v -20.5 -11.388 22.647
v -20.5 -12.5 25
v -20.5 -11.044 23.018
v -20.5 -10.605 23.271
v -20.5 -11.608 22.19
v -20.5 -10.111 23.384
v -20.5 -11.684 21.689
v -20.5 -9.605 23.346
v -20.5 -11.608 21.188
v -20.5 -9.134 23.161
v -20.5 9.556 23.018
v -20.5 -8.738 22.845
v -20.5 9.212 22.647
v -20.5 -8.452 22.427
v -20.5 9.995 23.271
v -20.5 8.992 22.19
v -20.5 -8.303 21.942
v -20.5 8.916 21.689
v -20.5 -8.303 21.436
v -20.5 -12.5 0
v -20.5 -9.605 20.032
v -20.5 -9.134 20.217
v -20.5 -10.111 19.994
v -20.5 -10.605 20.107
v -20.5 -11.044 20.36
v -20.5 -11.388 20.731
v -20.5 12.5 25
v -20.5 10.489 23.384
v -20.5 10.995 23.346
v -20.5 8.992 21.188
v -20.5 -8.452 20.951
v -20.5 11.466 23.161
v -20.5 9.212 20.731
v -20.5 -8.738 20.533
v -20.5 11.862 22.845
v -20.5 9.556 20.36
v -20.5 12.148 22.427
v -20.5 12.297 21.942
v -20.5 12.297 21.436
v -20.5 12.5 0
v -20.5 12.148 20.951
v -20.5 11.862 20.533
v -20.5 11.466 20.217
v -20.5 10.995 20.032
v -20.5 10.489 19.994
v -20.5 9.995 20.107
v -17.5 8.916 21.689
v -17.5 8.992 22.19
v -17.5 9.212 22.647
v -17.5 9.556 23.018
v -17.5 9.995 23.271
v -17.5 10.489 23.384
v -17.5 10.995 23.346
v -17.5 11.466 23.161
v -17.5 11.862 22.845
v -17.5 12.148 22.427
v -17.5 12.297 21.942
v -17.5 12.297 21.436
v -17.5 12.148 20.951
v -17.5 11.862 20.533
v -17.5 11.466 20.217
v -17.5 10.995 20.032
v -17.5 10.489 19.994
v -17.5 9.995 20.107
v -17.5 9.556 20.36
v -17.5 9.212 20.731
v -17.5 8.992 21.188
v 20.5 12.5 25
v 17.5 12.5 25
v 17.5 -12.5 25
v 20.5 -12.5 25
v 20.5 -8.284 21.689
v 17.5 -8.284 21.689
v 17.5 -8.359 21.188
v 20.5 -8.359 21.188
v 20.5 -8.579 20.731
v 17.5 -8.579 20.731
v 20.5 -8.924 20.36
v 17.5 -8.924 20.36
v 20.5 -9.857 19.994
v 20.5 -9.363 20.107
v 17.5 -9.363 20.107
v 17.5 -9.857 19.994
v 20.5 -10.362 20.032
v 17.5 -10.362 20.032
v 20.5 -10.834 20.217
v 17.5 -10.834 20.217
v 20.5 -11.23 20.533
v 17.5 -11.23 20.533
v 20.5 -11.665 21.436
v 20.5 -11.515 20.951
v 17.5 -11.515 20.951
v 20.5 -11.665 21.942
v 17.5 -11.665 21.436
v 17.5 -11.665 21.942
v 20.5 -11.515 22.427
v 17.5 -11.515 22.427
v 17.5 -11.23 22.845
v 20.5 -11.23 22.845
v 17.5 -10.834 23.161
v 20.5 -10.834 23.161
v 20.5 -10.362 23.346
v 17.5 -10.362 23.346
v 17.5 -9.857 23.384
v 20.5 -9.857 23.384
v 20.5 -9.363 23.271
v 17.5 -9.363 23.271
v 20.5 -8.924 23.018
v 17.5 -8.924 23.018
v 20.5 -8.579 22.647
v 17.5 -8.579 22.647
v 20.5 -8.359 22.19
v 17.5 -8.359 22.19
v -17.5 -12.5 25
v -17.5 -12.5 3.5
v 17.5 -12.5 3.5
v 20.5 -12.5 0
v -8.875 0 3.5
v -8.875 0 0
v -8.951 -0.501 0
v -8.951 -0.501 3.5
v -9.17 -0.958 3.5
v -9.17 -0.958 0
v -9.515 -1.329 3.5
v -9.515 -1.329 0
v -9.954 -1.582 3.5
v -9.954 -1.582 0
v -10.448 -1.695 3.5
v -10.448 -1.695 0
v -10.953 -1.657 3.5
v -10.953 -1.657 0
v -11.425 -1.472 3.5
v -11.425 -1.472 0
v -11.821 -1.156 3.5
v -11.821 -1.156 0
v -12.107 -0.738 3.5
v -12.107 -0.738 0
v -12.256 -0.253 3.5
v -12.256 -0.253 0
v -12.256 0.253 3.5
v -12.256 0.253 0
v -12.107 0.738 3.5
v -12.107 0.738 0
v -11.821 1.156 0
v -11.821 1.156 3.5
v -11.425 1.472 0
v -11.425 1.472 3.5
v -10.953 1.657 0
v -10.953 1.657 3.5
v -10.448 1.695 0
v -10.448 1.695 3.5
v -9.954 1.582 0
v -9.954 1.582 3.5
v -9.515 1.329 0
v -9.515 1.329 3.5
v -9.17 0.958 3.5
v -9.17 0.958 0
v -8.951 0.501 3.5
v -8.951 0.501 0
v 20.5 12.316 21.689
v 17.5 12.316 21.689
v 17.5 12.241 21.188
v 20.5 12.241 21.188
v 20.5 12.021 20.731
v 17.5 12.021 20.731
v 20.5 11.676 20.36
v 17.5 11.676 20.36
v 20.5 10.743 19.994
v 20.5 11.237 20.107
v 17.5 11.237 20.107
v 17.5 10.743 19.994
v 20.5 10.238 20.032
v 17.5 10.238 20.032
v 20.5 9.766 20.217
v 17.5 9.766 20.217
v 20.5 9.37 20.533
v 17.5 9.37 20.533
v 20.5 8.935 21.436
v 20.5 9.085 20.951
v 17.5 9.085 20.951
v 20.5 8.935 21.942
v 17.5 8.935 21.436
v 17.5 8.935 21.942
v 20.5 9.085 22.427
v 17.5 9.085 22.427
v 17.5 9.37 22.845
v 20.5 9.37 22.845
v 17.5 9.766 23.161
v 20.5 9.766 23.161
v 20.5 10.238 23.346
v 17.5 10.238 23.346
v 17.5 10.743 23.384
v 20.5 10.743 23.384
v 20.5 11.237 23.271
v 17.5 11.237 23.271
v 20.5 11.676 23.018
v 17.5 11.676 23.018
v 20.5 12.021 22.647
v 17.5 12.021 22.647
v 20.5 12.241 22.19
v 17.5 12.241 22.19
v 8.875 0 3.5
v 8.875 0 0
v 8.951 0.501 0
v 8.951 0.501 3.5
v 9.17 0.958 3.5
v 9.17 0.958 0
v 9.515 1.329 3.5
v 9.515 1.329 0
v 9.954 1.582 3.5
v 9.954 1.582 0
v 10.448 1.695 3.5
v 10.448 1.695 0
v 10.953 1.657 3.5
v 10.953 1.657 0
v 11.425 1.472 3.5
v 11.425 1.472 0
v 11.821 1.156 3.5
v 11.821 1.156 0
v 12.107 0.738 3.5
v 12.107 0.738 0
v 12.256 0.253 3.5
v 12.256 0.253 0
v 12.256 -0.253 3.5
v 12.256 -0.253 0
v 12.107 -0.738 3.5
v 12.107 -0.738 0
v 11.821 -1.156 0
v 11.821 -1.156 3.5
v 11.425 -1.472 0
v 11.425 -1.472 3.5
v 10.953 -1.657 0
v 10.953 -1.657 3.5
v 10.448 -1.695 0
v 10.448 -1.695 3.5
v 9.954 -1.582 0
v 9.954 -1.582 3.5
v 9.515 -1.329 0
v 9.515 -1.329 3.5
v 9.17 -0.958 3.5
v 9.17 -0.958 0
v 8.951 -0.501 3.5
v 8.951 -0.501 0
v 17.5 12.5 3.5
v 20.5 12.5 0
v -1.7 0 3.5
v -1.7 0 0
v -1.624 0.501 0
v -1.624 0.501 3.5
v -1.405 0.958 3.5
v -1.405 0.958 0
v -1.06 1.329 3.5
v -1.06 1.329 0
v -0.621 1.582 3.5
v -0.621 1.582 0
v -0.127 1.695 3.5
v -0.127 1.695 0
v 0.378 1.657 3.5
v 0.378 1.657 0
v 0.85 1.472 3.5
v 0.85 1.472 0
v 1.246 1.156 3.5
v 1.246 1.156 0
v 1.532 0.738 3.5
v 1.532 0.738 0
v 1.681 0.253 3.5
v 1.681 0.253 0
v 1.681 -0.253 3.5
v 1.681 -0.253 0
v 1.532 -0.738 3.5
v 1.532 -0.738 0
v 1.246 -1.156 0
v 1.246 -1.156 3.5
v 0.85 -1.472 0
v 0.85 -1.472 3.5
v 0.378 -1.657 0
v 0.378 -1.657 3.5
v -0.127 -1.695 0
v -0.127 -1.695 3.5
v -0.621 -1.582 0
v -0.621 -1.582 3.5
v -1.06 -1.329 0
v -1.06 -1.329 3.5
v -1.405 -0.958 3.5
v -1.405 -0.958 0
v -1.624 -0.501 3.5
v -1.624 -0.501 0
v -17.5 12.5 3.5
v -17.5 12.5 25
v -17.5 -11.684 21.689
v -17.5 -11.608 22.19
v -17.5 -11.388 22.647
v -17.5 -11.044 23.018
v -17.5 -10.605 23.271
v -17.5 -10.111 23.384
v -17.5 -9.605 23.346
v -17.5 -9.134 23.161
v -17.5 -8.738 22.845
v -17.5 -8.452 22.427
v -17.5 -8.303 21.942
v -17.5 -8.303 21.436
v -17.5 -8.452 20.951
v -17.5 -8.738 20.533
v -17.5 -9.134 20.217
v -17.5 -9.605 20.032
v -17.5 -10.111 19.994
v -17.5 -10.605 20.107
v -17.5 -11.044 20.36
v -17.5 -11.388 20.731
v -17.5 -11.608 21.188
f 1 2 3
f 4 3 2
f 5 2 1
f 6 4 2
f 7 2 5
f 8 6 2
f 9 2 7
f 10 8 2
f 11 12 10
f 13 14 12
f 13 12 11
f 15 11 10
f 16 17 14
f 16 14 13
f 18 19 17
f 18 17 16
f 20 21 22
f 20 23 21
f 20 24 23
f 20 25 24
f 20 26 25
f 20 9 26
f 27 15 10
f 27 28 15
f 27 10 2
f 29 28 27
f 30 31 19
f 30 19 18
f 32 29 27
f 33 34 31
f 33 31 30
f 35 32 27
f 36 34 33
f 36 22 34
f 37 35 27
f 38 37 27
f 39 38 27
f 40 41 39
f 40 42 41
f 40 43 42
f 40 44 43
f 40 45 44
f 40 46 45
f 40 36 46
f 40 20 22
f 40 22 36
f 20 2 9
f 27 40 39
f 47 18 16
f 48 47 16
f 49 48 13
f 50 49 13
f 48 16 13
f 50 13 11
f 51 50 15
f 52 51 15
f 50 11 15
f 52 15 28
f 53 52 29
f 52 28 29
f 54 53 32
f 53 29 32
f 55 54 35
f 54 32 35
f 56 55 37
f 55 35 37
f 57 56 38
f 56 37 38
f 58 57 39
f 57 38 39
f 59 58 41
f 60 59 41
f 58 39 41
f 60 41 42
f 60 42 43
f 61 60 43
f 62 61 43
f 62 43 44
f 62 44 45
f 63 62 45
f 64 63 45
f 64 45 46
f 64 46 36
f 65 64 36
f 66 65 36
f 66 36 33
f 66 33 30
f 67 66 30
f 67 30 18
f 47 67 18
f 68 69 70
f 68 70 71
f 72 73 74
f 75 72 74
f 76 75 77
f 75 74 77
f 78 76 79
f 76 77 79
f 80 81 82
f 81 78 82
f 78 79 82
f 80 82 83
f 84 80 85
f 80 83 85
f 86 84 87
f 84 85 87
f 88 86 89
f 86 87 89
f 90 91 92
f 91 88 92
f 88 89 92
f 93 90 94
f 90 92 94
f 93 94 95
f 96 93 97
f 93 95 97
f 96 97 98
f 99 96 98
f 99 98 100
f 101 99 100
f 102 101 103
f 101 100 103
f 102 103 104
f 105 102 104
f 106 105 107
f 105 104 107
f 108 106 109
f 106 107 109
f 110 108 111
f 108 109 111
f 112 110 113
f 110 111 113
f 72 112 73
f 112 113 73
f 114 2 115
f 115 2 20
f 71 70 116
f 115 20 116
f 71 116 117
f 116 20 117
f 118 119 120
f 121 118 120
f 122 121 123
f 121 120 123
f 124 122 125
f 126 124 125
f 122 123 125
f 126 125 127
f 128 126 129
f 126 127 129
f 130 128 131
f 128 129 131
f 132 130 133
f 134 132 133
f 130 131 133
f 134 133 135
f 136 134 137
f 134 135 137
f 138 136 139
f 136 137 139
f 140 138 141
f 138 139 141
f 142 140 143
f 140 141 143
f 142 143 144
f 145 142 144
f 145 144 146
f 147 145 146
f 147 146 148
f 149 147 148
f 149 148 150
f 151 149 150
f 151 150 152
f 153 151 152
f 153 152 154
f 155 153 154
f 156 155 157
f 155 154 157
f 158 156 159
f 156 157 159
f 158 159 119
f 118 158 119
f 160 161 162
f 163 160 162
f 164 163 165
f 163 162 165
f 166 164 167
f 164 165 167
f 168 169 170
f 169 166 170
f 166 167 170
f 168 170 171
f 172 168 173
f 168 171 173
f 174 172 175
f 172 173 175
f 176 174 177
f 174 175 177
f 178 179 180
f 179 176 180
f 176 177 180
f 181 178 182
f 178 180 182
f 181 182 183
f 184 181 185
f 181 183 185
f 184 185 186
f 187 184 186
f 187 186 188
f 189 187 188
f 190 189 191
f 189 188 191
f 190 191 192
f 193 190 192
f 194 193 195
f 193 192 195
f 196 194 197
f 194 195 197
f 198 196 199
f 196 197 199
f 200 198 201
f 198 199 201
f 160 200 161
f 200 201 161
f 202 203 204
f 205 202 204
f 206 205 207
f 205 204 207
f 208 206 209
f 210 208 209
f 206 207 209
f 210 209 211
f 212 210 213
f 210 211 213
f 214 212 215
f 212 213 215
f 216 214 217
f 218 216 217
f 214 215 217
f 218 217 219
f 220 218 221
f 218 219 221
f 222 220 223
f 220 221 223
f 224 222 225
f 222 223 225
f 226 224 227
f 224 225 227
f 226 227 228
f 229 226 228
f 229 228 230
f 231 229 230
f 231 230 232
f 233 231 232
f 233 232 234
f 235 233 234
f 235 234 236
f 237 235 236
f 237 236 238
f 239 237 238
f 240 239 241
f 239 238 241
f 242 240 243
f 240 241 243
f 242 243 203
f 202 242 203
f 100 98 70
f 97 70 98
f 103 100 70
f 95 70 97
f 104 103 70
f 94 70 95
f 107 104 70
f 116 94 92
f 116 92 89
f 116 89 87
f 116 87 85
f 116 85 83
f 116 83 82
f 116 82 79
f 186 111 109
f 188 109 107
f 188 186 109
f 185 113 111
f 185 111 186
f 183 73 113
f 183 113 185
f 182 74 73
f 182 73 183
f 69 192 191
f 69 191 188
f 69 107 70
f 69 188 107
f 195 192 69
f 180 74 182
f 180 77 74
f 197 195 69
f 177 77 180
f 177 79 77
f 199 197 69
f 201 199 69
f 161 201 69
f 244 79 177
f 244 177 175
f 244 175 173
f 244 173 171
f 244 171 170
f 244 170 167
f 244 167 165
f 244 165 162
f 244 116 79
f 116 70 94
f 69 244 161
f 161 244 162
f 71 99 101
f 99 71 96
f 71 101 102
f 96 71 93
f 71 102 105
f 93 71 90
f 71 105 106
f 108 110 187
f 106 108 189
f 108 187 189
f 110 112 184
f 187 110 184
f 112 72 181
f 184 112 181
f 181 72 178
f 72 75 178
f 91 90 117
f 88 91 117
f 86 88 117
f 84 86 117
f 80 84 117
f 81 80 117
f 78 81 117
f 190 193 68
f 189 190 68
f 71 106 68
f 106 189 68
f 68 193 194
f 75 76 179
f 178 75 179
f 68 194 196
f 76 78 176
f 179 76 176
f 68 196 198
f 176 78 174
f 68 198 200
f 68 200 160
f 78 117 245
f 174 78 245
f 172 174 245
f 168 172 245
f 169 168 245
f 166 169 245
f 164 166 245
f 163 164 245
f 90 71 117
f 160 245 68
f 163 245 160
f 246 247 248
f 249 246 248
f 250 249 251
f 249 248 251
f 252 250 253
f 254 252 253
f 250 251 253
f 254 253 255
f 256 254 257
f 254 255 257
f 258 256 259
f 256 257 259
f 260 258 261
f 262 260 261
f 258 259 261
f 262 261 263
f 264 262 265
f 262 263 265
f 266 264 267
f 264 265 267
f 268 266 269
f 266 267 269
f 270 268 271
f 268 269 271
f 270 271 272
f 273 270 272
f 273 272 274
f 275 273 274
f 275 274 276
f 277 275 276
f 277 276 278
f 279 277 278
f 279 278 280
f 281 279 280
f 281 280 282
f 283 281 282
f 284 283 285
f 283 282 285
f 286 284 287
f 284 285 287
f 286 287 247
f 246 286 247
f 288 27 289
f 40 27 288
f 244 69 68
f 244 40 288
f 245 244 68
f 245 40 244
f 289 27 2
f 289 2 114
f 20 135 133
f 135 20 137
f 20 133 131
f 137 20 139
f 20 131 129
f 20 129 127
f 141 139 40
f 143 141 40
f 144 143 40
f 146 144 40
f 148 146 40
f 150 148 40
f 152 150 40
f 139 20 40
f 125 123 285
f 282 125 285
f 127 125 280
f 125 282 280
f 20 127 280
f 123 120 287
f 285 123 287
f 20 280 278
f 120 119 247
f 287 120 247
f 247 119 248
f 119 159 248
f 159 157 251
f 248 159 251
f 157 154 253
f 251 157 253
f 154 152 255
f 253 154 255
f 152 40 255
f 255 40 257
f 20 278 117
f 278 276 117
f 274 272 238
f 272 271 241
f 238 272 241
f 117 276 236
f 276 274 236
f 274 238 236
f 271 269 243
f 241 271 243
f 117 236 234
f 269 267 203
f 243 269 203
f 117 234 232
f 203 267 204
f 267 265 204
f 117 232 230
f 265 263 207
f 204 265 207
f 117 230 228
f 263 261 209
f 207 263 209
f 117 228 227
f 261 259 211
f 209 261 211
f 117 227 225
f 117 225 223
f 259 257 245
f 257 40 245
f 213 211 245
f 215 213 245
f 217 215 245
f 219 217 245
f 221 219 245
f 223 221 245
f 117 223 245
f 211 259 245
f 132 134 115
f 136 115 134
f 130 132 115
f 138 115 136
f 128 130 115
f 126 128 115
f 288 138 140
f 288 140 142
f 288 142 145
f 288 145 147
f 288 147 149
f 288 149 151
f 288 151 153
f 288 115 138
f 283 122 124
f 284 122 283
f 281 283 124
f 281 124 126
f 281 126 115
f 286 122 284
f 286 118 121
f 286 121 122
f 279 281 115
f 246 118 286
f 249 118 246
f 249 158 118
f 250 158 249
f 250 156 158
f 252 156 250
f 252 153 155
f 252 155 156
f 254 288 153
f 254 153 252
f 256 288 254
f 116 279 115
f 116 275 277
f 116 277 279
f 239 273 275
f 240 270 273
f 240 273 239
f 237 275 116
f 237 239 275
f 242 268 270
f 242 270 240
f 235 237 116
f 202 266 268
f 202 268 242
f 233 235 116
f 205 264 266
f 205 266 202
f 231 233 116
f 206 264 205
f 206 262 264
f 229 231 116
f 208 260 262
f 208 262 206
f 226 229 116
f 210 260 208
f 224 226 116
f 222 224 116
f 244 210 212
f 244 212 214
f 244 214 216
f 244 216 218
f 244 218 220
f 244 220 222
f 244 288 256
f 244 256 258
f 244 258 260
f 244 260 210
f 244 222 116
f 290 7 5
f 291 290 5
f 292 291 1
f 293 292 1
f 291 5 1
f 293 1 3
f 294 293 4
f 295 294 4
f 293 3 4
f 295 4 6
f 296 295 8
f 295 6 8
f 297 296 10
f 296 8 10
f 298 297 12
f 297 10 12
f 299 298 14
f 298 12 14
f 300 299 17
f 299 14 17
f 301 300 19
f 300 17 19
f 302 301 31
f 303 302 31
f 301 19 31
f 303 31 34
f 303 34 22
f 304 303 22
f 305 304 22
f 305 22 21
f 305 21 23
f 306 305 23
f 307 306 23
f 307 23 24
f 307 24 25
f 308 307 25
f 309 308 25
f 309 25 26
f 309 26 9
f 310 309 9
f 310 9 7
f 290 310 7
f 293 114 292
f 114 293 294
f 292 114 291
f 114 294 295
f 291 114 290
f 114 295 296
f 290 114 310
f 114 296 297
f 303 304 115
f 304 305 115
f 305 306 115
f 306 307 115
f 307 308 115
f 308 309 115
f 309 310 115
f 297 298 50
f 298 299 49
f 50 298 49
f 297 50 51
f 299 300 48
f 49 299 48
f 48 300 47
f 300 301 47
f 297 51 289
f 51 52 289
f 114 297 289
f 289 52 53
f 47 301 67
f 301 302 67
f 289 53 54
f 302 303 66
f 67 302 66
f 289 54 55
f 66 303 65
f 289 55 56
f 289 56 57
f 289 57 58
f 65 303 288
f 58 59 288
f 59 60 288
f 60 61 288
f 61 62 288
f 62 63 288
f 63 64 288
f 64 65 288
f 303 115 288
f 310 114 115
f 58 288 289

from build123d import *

# Parameters (mm, degrees)
F0_W     = 35
F0_H     = 25
F2_DEPTH = 3.5
F0_W_2   = 3
F3_DEPTH = 25
F4_DEPTH = 25
F5_D     = 3.4
F5_DEPTH = 20.501
F6_D     = 3.4
F6_DEPTH = 20.501
F7_D     = 3.4


with BuildPart() as f2:
    # F0 (on Top) → F2 (new body)
    with BuildSketch(Plane.XY):
        Rectangle(F0_W, F0_H)
        with BuildLine():
            ThreePointArc((-12.275, 0), (-10.575, 1.7), (-8.875, 0))
            ThreePointArc((-8.875, 0), (-10.575, -1.7), (-12.275, 0))
        make_face(mode=Mode.SUBTRACT)
        with BuildLine():
            ThreePointArc((1.7, 0), (0, -1.7), (-1.7, 0))
            ThreePointArc((-1.7, 0), (0, 1.7), (1.7, 0))
        make_face(mode=Mode.SUBTRACT)
        with BuildLine():
            ThreePointArc((12.275, 0), (10.575, -1.7), (8.875, 0))
            ThreePointArc((8.875, 0), (10.575, 1.7), (12.275, 0))
        make_face(mode=Mode.SUBTRACT)
    extrude(amount=F2_DEPTH)

    # F0 (on Top) → F3 (join)
    with BuildSketch(Plane.XY):
        with Locations((-19, 0)):
            Rectangle(F0_W_2, F0_H)
    extrude(amount=F3_DEPTH)

    # F0 (on Top) → F4 (join)
    with BuildSketch(Plane.XY):
        with Locations((19, 0)):
            Rectangle(F0_W_2, F0_H)
    extrude(amount=F4_DEPTH)

    # F5 (through all, one way)
    with BuildSketch(Plane(origin=(0, 0, 0), x_dir=(0, 1, 0), z_dir=(-1, 0, 0))):
        with Locations((-9.9837460197, -21.689)):
            Circle(F5_D / 2)
    extrude(amount=-F5_DEPTH, mode=Mode.SUBTRACT)

    # F6 (through all, one way)
    with BuildSketch(Plane(origin=(0, 0, 0), x_dir=(0, 1, 0), z_dir=(-1, 0, 0))):
        with Locations((10.6162539803, -21.689)):
            Circle(F6_D / 2)
    extrude(amount=-F6_DEPTH, mode=Mode.SUBTRACT)

    # F7 (through all)
    with Locations(Plane.YZ):
        with Locations((-9.9837460197, 21.689), (10.6162539803, 21.689)):
            Hole(F7_D / 2)


solid = f2.part
